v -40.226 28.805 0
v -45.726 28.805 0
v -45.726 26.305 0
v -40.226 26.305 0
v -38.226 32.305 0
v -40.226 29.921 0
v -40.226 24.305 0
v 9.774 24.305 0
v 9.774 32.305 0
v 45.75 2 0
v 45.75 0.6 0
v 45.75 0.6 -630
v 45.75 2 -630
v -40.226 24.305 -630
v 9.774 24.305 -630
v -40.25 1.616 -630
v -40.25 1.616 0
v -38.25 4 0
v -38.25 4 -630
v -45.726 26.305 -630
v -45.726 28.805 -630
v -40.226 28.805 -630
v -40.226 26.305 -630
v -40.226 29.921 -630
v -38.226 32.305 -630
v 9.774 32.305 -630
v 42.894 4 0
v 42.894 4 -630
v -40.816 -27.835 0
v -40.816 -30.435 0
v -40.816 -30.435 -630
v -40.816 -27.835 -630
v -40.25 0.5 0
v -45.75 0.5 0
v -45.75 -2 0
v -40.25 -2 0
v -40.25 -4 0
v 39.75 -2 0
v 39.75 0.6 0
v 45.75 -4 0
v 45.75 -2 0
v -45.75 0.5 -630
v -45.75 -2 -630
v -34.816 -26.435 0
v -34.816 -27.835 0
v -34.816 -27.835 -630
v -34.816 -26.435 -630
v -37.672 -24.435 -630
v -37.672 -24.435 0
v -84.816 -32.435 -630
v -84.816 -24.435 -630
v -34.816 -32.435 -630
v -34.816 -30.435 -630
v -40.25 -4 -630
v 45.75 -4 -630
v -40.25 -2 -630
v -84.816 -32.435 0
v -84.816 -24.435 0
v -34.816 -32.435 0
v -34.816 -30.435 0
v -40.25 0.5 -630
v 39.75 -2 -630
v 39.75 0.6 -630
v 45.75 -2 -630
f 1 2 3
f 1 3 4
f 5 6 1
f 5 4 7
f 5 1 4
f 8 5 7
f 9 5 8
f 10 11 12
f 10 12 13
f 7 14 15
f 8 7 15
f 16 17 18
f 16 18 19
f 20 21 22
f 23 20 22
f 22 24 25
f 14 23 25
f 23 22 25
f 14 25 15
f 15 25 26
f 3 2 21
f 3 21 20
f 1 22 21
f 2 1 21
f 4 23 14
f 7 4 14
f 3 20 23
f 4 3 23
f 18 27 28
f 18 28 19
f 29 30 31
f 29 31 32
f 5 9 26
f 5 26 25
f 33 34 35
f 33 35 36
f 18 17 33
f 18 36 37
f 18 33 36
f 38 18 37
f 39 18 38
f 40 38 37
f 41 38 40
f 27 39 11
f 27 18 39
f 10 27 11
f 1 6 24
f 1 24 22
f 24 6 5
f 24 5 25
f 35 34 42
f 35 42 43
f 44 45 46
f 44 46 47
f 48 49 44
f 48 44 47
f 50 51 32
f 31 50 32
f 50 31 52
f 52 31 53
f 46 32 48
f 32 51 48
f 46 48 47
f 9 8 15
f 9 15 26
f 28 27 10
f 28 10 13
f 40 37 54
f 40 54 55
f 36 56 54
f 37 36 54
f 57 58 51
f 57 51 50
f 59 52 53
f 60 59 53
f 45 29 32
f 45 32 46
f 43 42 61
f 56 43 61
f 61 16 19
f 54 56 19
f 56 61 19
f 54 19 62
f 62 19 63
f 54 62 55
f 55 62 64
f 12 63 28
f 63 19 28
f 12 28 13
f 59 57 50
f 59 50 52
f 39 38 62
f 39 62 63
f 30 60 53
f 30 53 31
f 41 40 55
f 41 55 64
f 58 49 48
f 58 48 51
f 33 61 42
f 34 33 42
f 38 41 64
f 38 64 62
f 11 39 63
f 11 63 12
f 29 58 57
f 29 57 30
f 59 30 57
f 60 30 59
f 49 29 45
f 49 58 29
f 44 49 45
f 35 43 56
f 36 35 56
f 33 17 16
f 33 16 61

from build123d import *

# Parameters (mm, degrees)
F1_DEPTH = 630
F2_SIZE2 = 2.3835071852
F2_SIZE  = 2
F3_SIZE2 = 2.8562960135
F3_SIZE  = 2
F4_DEPTH = 630
F5_DEPTH = 630
F6_SIZE2 = 2.3835071852
F6_SIZE  = 2
F7_SIZE2 = 2.8562960135
F7_SIZE  = 2


with BuildPart() as f1:
    # F0 (on Top) → F1 (new body)
    with BuildSketch(Plane.XY):
        Polygon((45.75, 0.6), (45.75, 4), (-40.25, 4), (-40.25, 0.5), (-45.75, 0.5), (-45.75, -2), (-40.25, -2), (-40.25, -4), (45.75, -4), (45.75, -2), (39.75, -2), (39.75, 0.6), align=None)
    extrude(amount=-F1_DEPTH)

    # F2
    f2_edges = [f1.edges().sort_by_distance(p)[0] for p in [
        (-40.25, 4, -315),
    ]]
    f2_side = f1.faces().sort_by_distance((2.75, 4, -315))[0]
    chamfer(f2_edges, length=F2_SIZE, length2=F2_SIZE2, reference=f2_side)

    # F3
    f3_edges = [f1.edges().sort_by_distance(p)[0] for p in [
        (45.75, 4, -315),
    ]]
    f3_side = f1.faces().sort_by_distance((45.75, 2.3, -315))[0]
    chamfer(f3_edges, length=F3_SIZE, length2=F3_SIZE2, reference=f3_side)


with BuildPart() as f4:
    # F0 (on Top) → F4 (new body)
    with BuildSketch(Plane.XY):
        Polygon((9.7738518756, 28.9047427452), (9.7738518756, 32.3047427452), (-40.2261481244, 32.3047427452), (-40.2261481244, 28.8047427452), (-45.7261481244, 28.8047427452), (-45.7261481244, 26.3047427452), (-40.2261481244, 26.3047427452), (-40.2261481244, 24.3047427452), (9.7738518756, 24.3047427452), (9.7738518756, 26.3047427452), align=None)
    extrude(amount=-F4_DEPTH)

    # F6
    f6_edges = [f4.edges().sort_by_distance(p)[0] for p in [
        (-40.226148, 32.304743, -315),
    ]]
    f6_side = f4.faces().sort_by_distance((-15.226148, 32.304743, -315))[0]
    chamfer(f6_edges, length=F6_SIZE, length2=F6_SIZE2, reference=f6_side)


with BuildPart() as f5:
    # F0 (on Top) → F5 (new body)
    with BuildSketch(Plane.XY):
        Polygon((-34.8161143508, -27.8352580988), (-34.8161143508, -24.4352580988), (-79.3161143508, -24.4352580988), (-84.8161143508, -24.4352580988), (-84.8161143508, -30.4352580988), (-84.8161143508, -32.4352580988), (-45.8161143508, -32.4352580988), (-40.3161143508, -32.4352580988), (-34.8161143508, -32.4352580988), (-34.8161143508, -30.4352580988), (-40.8161143508, -30.4352580988), (-40.8161143508, -27.8352580988), align=None)
    extrude(amount=-F5_DEPTH)

    # F7
    f7_edges = [f5.edges().sort_by_distance(p)[0] for p in [
        (-34.816114, -24.435258, -315),
    ]]
    f7_side = f5.faces().sort_by_distance((-34.816114, -26.135258, -315))[0]
    chamfer(f7_edges, length=F7_SIZE, length2=F7_SIZE2, reference=f7_side)


solid = Compound([f1.part, f4.part, f5.part])
